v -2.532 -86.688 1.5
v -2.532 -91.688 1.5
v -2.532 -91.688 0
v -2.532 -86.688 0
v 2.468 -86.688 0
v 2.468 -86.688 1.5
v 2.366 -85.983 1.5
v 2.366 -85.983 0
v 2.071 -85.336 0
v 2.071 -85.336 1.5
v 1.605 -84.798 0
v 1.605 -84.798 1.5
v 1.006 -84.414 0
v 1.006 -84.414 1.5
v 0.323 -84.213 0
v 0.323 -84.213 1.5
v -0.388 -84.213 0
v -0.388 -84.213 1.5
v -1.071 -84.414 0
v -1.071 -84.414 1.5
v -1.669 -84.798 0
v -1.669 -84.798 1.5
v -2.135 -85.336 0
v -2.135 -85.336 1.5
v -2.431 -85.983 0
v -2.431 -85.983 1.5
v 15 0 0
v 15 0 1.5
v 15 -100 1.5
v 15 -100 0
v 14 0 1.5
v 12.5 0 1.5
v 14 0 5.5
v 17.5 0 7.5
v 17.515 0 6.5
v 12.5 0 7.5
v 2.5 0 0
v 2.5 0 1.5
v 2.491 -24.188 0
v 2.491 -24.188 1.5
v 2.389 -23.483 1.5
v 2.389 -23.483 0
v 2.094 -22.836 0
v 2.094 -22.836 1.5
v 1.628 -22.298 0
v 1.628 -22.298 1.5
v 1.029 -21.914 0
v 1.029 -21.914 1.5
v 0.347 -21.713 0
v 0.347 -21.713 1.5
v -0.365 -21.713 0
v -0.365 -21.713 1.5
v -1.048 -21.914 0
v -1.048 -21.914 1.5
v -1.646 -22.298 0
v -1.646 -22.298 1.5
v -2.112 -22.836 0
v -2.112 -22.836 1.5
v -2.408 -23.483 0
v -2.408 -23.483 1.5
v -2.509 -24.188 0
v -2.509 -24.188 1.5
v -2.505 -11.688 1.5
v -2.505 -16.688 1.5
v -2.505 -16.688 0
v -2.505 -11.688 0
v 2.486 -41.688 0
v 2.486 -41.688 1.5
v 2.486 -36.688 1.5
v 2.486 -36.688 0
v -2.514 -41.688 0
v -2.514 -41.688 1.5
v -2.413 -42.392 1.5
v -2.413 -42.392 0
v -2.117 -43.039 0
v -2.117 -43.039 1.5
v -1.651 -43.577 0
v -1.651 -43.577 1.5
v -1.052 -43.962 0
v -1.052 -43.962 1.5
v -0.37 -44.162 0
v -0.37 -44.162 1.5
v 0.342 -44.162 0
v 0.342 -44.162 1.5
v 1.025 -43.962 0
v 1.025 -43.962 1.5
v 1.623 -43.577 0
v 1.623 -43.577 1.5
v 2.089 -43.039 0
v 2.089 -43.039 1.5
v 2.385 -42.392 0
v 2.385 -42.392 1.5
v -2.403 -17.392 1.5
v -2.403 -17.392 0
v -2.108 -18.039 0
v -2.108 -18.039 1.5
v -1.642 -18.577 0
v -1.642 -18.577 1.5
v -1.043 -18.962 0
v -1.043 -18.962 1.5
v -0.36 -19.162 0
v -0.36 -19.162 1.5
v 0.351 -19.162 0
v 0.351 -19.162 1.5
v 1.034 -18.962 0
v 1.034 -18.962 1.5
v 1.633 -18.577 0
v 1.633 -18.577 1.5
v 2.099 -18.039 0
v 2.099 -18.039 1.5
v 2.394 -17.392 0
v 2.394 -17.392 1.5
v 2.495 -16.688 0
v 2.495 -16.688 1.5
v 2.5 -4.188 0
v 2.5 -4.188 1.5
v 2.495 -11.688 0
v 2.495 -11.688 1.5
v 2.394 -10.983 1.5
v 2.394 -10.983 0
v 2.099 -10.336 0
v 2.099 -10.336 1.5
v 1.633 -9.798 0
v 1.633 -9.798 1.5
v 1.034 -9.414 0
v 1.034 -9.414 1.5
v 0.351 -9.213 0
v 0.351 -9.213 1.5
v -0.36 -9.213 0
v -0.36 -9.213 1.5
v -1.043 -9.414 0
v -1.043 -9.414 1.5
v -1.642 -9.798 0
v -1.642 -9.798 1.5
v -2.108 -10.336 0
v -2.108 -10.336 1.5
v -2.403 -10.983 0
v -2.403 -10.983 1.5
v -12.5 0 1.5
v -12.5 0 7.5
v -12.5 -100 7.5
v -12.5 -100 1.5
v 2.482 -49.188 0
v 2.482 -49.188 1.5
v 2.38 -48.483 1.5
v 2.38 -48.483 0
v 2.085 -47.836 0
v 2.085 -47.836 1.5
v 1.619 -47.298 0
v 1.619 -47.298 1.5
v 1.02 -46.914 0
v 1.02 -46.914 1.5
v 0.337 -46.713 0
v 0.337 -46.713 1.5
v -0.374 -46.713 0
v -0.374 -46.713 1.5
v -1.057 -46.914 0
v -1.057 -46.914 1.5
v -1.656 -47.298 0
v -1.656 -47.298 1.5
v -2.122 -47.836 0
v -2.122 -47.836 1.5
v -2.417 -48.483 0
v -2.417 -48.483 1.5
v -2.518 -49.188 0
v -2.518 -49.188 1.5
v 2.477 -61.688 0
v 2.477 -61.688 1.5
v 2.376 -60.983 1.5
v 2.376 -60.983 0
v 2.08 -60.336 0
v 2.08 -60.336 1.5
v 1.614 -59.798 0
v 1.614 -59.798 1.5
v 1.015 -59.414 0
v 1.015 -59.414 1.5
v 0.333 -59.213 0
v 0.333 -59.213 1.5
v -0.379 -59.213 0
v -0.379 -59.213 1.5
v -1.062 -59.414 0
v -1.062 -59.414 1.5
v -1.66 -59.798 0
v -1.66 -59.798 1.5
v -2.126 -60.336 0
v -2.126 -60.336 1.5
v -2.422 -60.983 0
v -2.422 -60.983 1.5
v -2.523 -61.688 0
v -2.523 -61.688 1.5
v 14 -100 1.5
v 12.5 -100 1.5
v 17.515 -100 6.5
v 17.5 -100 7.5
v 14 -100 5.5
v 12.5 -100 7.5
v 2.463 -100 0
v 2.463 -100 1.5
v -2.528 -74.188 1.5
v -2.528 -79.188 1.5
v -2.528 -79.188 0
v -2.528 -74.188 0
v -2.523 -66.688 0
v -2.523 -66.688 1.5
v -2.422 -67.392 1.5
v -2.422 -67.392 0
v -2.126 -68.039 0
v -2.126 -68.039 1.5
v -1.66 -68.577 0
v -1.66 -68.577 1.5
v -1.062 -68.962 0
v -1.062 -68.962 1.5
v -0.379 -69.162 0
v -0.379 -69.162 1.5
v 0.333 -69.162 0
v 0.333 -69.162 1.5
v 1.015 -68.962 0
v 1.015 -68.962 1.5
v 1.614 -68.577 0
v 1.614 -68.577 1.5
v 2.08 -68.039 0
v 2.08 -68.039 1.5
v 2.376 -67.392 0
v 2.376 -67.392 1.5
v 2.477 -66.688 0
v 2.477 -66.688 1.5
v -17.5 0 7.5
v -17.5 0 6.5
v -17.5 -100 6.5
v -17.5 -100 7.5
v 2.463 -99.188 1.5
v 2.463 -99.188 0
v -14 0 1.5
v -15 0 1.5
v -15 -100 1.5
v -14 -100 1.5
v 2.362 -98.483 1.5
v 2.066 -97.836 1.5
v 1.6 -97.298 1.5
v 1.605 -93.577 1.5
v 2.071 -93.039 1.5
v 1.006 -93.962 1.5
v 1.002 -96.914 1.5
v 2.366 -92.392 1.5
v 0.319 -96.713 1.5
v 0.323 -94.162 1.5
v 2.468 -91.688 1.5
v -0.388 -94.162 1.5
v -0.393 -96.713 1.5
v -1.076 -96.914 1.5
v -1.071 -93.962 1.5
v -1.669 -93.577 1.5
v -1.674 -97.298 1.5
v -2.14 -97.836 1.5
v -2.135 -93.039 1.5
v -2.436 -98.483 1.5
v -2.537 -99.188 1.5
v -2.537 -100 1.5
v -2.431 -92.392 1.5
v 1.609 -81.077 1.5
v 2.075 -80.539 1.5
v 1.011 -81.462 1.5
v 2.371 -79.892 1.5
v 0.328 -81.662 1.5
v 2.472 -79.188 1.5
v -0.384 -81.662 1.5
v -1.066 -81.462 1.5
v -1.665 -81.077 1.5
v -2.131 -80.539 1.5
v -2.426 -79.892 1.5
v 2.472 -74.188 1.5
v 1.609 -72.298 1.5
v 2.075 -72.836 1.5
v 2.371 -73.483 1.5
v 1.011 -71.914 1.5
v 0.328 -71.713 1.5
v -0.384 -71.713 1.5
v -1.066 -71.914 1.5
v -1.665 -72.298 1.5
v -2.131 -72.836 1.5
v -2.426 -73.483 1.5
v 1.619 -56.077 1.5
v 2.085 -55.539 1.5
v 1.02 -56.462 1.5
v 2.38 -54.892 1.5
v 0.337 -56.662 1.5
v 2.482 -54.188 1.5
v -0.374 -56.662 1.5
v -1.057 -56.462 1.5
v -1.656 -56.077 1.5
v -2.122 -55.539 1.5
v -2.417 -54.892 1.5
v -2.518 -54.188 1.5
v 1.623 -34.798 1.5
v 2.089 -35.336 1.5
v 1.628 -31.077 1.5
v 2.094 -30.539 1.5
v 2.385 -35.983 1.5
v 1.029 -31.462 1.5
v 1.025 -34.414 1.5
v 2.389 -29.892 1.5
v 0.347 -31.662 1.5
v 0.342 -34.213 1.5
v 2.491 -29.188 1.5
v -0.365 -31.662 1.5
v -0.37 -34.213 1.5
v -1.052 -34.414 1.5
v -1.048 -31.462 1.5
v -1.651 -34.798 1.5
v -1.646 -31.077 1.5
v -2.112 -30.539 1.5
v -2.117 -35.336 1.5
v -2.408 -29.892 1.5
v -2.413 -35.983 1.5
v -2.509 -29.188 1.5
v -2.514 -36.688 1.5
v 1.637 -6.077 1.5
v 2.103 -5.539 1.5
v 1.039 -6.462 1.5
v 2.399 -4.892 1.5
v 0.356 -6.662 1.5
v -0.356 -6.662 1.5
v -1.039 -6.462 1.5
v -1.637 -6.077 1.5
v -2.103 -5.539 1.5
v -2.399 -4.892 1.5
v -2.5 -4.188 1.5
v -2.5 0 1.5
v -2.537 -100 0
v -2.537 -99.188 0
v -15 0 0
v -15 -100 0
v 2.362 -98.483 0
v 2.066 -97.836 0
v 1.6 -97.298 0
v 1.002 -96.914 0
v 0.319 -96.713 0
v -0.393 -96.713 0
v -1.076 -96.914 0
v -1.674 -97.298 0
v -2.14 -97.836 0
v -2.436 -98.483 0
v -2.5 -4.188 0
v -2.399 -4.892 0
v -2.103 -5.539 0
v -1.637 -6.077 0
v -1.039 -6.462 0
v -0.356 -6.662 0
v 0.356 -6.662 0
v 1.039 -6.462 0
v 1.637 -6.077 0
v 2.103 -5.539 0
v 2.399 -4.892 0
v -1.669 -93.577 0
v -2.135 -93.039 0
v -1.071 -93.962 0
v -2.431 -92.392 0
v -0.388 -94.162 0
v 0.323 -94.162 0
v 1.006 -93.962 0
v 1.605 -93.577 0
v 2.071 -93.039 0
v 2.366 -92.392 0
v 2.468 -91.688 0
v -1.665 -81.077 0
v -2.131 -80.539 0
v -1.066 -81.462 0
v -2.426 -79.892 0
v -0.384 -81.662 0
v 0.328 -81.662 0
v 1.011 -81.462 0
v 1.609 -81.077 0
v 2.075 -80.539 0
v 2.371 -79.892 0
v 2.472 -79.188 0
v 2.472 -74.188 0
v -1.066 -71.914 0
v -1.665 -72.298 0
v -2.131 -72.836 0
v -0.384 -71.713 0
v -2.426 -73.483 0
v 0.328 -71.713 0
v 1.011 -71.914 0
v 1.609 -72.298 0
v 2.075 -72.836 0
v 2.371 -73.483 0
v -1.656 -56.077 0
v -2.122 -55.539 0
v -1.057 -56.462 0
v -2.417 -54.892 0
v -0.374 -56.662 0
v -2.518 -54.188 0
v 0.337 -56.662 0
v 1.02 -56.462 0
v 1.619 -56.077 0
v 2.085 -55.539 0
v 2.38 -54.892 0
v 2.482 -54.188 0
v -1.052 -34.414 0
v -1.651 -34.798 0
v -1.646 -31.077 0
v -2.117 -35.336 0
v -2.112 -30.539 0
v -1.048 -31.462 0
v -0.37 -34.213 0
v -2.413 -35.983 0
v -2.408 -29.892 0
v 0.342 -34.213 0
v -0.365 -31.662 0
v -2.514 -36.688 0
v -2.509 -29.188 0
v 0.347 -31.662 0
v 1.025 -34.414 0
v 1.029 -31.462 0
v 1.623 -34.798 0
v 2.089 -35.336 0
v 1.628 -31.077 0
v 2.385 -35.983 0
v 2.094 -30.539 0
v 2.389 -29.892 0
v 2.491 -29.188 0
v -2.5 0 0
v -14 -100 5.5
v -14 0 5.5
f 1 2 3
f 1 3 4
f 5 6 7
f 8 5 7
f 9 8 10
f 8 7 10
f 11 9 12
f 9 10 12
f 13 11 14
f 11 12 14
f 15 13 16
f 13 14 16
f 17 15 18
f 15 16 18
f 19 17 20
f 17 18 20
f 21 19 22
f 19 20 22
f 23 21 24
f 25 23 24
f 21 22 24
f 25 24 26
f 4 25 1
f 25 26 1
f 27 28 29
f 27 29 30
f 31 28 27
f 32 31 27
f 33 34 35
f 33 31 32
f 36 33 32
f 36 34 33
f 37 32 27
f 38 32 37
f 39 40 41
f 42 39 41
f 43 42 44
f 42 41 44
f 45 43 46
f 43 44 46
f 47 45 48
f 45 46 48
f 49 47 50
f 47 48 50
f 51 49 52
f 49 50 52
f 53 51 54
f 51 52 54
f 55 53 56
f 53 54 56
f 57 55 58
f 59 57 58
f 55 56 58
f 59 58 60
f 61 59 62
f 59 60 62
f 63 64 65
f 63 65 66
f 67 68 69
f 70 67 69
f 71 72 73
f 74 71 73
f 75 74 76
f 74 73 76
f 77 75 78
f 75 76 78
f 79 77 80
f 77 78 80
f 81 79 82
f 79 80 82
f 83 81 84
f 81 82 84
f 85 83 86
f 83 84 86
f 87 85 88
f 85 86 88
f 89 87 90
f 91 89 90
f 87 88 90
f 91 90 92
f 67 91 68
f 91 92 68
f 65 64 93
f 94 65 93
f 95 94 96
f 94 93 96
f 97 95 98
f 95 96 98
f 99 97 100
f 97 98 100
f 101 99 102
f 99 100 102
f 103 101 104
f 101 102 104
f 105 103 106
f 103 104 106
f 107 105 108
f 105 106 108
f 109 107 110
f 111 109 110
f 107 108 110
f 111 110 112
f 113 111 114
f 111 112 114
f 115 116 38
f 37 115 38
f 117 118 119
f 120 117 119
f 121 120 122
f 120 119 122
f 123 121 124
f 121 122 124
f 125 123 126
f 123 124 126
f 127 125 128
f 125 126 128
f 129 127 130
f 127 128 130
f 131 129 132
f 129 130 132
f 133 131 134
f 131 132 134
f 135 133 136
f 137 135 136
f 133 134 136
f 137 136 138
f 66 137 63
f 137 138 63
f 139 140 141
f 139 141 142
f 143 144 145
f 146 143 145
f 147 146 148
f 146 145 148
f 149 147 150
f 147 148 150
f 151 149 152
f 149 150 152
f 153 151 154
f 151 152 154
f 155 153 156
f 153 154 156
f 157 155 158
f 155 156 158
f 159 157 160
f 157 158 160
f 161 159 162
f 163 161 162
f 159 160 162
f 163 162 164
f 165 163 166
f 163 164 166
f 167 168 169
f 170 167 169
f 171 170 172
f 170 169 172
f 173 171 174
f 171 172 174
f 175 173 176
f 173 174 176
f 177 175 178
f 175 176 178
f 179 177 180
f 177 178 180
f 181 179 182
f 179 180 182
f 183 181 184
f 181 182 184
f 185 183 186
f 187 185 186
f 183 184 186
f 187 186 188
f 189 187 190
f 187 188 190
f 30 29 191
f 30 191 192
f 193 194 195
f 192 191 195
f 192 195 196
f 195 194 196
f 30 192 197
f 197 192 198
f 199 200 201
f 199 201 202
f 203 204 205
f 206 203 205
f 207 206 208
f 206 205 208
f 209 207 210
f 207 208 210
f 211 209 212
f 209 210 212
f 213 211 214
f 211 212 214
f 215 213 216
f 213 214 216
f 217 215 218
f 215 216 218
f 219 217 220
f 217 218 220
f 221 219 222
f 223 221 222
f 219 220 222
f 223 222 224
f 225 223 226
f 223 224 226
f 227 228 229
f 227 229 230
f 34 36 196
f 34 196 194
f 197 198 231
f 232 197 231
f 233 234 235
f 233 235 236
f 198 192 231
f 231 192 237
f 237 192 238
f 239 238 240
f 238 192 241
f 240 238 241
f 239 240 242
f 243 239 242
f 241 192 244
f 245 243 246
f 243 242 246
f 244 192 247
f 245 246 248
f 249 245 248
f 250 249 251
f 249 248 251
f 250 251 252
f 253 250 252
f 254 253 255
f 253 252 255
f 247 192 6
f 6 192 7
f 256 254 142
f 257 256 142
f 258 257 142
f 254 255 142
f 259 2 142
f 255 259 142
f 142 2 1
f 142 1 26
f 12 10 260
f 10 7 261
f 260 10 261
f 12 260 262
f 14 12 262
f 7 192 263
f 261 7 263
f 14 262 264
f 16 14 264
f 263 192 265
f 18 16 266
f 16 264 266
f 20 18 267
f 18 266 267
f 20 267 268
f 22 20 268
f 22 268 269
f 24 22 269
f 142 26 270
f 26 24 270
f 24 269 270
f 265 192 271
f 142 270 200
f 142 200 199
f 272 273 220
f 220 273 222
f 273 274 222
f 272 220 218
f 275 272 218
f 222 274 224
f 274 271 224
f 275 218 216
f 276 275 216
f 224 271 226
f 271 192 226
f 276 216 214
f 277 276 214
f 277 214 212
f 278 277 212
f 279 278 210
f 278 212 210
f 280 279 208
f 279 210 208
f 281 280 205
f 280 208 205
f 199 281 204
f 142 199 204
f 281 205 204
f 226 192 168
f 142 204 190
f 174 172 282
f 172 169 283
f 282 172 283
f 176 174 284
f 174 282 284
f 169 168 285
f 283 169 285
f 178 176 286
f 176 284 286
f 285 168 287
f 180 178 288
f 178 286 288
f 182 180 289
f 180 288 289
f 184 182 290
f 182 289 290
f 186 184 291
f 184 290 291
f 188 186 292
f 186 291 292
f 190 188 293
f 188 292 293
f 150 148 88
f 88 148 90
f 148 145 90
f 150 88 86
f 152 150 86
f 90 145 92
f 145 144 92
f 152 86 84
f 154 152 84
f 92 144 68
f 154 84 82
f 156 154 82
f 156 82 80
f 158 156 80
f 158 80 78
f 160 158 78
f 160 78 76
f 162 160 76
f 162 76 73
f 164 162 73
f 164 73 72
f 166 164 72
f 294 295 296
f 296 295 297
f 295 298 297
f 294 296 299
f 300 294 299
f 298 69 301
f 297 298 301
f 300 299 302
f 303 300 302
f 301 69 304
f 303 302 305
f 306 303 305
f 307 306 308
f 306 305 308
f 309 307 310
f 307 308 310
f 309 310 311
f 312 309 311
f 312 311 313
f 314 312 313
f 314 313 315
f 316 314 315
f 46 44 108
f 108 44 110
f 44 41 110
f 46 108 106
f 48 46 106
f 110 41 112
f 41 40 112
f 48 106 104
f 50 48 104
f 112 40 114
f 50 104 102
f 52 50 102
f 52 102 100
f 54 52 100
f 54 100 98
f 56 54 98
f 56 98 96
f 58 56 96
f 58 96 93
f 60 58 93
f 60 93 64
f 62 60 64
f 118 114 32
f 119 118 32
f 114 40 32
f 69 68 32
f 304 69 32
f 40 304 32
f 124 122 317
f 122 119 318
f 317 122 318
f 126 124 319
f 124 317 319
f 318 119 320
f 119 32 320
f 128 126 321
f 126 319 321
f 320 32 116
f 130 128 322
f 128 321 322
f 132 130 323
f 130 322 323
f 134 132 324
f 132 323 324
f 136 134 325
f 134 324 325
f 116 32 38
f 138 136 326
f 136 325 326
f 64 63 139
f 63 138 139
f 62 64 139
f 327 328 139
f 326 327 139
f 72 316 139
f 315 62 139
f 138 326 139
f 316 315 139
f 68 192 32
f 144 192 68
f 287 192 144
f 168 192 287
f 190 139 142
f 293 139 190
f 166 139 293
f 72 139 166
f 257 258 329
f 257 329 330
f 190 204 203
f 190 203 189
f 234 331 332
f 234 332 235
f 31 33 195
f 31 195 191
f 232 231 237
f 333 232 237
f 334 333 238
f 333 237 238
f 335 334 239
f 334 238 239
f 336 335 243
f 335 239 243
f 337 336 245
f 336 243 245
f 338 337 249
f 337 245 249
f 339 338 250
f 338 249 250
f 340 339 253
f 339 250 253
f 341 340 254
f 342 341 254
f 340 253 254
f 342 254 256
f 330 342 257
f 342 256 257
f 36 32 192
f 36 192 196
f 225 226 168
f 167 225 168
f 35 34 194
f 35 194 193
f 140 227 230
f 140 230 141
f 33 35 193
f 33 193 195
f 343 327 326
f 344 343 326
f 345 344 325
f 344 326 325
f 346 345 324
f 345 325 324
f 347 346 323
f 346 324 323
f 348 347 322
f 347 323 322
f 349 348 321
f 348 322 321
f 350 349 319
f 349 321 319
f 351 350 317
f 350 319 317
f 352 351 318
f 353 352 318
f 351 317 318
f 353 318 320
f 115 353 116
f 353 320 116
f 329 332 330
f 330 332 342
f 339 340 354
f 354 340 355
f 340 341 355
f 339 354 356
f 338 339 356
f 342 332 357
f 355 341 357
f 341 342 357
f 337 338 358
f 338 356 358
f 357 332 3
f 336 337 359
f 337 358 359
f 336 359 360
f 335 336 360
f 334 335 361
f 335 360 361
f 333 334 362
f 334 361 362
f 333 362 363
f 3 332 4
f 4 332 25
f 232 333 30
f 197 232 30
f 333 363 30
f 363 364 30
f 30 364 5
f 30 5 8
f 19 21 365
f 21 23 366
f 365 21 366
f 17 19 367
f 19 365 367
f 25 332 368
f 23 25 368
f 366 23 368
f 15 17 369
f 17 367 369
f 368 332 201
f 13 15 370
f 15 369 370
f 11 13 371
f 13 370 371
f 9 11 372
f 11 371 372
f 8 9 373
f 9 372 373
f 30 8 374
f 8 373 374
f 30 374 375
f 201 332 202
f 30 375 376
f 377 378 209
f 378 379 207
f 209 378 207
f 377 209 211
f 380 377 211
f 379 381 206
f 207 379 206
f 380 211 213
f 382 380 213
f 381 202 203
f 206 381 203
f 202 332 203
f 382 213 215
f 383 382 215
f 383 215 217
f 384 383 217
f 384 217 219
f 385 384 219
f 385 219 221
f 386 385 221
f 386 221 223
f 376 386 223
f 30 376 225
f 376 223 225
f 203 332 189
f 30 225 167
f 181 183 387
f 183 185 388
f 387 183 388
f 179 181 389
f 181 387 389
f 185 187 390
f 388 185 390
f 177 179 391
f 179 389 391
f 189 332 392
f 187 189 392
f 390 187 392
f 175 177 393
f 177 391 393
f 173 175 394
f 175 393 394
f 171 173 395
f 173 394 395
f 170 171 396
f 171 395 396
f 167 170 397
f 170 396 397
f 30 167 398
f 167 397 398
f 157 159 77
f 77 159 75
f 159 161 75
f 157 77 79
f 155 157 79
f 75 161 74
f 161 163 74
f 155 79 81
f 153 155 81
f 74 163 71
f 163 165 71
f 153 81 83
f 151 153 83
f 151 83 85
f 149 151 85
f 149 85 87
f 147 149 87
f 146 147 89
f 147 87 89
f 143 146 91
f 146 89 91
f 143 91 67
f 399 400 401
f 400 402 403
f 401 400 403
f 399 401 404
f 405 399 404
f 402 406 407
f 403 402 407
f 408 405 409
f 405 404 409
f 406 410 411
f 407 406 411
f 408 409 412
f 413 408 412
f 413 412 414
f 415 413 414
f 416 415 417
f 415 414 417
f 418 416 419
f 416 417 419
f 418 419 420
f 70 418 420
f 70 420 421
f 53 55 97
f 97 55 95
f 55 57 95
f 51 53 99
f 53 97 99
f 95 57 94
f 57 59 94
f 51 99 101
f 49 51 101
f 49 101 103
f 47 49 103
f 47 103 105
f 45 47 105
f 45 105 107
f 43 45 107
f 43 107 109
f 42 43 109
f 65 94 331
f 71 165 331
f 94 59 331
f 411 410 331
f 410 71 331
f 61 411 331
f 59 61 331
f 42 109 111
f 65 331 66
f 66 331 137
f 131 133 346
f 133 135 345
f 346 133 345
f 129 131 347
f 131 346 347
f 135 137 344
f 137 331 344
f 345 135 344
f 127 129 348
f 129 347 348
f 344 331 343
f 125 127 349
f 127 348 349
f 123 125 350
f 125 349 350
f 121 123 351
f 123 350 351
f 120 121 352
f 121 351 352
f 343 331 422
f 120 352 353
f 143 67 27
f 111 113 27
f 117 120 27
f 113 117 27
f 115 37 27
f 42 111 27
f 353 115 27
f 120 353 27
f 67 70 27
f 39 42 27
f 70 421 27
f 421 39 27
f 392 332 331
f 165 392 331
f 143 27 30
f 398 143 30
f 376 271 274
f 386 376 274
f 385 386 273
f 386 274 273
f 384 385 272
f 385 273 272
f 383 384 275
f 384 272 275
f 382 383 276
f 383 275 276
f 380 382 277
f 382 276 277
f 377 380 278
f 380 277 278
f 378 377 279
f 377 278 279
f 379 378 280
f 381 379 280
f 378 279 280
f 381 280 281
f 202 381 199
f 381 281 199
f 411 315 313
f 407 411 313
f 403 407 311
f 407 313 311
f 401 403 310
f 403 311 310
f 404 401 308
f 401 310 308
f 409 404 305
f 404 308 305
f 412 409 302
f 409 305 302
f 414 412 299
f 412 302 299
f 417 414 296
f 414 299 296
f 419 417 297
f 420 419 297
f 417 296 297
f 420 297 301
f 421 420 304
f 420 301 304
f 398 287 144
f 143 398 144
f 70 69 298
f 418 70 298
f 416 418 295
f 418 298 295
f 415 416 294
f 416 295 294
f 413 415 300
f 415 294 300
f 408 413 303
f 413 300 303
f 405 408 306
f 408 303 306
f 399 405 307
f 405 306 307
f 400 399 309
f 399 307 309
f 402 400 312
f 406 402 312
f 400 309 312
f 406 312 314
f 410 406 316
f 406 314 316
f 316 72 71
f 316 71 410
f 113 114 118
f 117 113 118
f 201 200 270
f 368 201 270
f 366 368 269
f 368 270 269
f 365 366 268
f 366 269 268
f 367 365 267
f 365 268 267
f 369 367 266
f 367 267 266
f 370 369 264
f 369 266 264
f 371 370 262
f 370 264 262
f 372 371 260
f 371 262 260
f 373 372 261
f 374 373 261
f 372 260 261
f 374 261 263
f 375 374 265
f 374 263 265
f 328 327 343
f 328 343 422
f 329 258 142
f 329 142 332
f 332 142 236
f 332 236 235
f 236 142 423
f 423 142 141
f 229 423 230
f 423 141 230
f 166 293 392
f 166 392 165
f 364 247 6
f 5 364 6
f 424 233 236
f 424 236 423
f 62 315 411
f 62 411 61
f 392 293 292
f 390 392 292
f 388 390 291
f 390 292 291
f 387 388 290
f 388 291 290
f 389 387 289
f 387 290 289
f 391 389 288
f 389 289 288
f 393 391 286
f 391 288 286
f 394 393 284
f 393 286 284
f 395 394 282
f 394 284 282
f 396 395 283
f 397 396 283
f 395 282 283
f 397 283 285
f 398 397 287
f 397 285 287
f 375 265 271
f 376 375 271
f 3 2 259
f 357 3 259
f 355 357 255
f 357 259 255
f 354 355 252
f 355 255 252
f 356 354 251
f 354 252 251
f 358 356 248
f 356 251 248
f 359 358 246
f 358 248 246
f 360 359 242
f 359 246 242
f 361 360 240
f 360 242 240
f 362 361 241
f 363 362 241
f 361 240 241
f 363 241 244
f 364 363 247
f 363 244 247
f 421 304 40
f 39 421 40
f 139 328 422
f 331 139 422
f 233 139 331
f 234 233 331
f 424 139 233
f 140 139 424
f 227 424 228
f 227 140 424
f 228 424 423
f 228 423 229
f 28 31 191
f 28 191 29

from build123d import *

# Parameters (mm, degrees)
PAD_DEPTH       = 100
POCKET_DEPTH    = 2
POCKET001_DEPTH = 3


with BuildPart() as part:
    # Sketch → Pad (new body)
    with BuildSketch(Plane.XZ):
        Polygon((0, 0), (-15, 0), (-15, 1.5), (-14, 1.5), (-14, 5.5), (-17.5, 6.5), (-17.5, 7.5), (-12.5, 7.5), (-12.5, 1.5), (0, 1.5), (12.5, 1.5), (12.5, 7.5), (17.5, 7.5), (17.51485, 6.5), (14, 5.5), (14, 1.5), (15, 1.5), (15, 0), align=None)
    extrude(amount=PAD_DEPTH)

    # Sketch001 (on Face10 of Pad) → Pocket (cut)
    with BuildSketch(Plane(origin=(0, 0, 1.5), x_dir=(-1, 0, 0), z_dir=(0, 0, 1))):
        with BuildLine():
            ThreePointArc((2.5, 4.187631), (0, 6.687631), (-2.5, 4.187631))
            Line((-2.5, 4.187631), (-2.5, -0.812369))
            ThreePointArc((-2.5, -0.812369), (0, -3.312369), (2.5, -0.812369))
            Line((2.5, 4.187631), (2.5, -0.812369))
        make_face()
        with BuildLine():
            ThreePointArc((2.50462, 16.68763), (0.00462, 19.18763), (-2.49538, 16.68763))
            Line((-2.49538, 16.68763), (-2.49538, 11.68763))
            ThreePointArc((-2.49538, 11.68763), (0.00462, 9.18763), (2.50462, 11.68763))
            Line((2.50462, 16.68763), (2.50462, 11.68763))
        make_face()
        with BuildLine():
            ThreePointArc((2.509241, 29.187629), (0.009241, 31.687629), (-2.490759, 29.187629))
            Line((-2.490759, 29.187629), (-2.490759, 24.187629))
            ThreePointArc((-2.490759, 24.187629), (0.009241, 21.687629), (2.509241, 24.187629))
            Line((2.509241, 29.187629), (2.509241, 24.187629))
        make_face()
        with BuildLine():
            ThreePointArc((2.513861, 41.687629), (0.013861, 44.187629), (-2.486139, 41.687629))
            Line((-2.486139, 41.687629), (-2.486139, 36.687629))
            ThreePointArc((-2.486139, 36.687629), (0.013861, 34.187629), (2.513861, 36.687629))
            Line((2.513861, 41.687629), (2.513861, 36.687629))
        make_face()
        with BuildLine():
            ThreePointArc((2.518482, 54.187628), (0.018482, 56.687628), (-2.481518, 54.187628))
            Line((-2.481518, 54.187628), (-2.481518, 49.187628))
            ThreePointArc((-2.481518, 49.187628), (0.018482, 46.687628), (2.518482, 49.187628))
            Line((2.518482, 54.187628), (2.518482, 49.187628))
        make_face()
        with BuildLine():
            ThreePointArc((2.523102, 66.687627), (0.023102, 69.187627), (-2.476898, 66.687627))
            Line((-2.476898, 66.687627), (-2.476898, 61.687627))
            ThreePointArc((-2.476898, 61.687627), (0.023102, 59.187627), (2.523102, 61.687627))
            Line((2.523102, 66.687627), (2.523102, 61.687627))
        make_face()
        with BuildLine():
            ThreePointArc((2.527723, 79.187626), (0.027723, 81.687626), (-2.472277, 79.187626))
            Line((-2.472277, 79.187626), (-2.472277, 74.187626))
            ThreePointArc((-2.472277, 74.187626), (0.027723, 71.687626), (2.527723, 74.187626))
            Line((2.527723, 79.187626), (2.527723, 74.187626))
        make_face()
        with BuildLine():
            ThreePointArc((2.532343, 91.687625), (0.032343, 94.187625), (-2.467657, 91.687625))
            Line((-2.467657, 91.687625), (-2.467657, 86.687625))
            ThreePointArc((-2.467657, 86.687625), (0.032343, 84.187625), (2.532343, 86.687625))
            Line((2.532343, 91.687625), (2.532343, 86.687625))
        make_face()
        with BuildLine():
            ThreePointArc((2.536964, 104.187624), (0.036964, 106.687624), (-2.463036, 104.187624))
            Line((-2.463036, 104.187624), (-2.463036, 99.187624))
            ThreePointArc((-2.463036, 99.187624), (0.036964, 96.687624), (2.536964, 99.187624))
            Line((2.536964, 104.187624), (2.536964, 99.187624))
        make_face()
        with BuildLine():
            ThreePointArc((2.541584, 116.687623), (0.041584, 119.187623), (-2.458416, 116.687623))
            Line((-2.458416, 116.687623), (-2.458416, 111.687623))
            ThreePointArc((-2.458416, 111.687623), (0.041584, 109.187623), (2.541584, 111.687623))
            Line((2.541584, 116.687623), (2.541584, 111.687623))
        make_face()
    extrude(amount=-POCKET_DEPTH, mode=Mode.SUBTRACT)

    # Sketch001 (on Face10 of Pad) → Pocket001 (cut)
    with BuildSketch(Plane(origin=(0, 0, 1.5), x_dir=(-1, 0, 0), z_dir=(0, 0, 1))):
        with BuildLine():
            ThreePointArc((2.5, 4.187631), (0, 6.687631), (-2.5, 4.187631))
            Line((-2.5, 4.187631), (-2.5, -0.812369))
            ThreePointArc((-2.5, -0.812369), (0, -3.312369), (2.5, -0.812369))
            Line((2.5, 4.187631), (2.5, -0.812369))
        make_face()
        with BuildLine():
            ThreePointArc((2.50462, 16.68763), (0.00462, 19.18763), (-2.49538, 16.68763))
            Line((-2.49538, 16.68763), (-2.49538, 11.68763))
            ThreePointArc((-2.49538, 11.68763), (0.00462, 9.18763), (2.50462, 11.68763))
            Line((2.50462, 16.68763), (2.50462, 11.68763))
        make_face()
        with BuildLine():
            ThreePointArc((2.509241, 29.187629), (0.009241, 31.687629), (-2.490759, 29.187629))
            Line((-2.490759, 29.187629), (-2.490759, 24.187629))
            ThreePointArc((-2.490759, 24.187629), (0.009241, 21.687629), (2.509241, 24.187629))
            Line((2.509241, 29.187629), (2.509241, 24.187629))
        make_face()
        with BuildLine():
            ThreePointArc((2.513861, 41.687629), (0.013861, 44.187629), (-2.486139, 41.687629))
            Line((-2.486139, 41.687629), (-2.486139, 36.687629))
            ThreePointArc((-2.486139, 36.687629), (0.013861, 34.187629), (2.513861, 36.687629))
            Line((2.513861, 41.687629), (2.513861, 36.687629))
        make_face()
        with BuildLine():
            ThreePointArc((2.518482, 54.187628), (0.018482, 56.687628), (-2.481518, 54.187628))
            Line((-2.481518, 54.187628), (-2.481518, 49.187628))
            ThreePointArc((-2.481518, 49.187628), (0.018482, 46.687628), (2.518482, 49.187628))
            Line((2.518482, 54.187628), (2.518482, 49.187628))
        make_face()
        with BuildLine():
            ThreePointArc((2.523102, 66.687627), (0.023102, 69.187627), (-2.476898, 66.687627))
            Line((-2.476898, 66.687627), (-2.476898, 61.687627))
            ThreePointArc((-2.476898, 61.687627), (0.023102, 59.187627), (2.523102, 61.687627))
            Line((2.523102, 66.687627), (2.523102, 61.687627))
        make_face()
        with BuildLine():
            ThreePointArc((2.527723, 79.187626), (0.027723, 81.687626), (-2.472277, 79.187626))
            Line((-2.472277, 79.187626), (-2.472277, 74.187626))
            ThreePointArc((-2.472277, 74.187626), (0.027723, 71.687626), (2.527723, 74.187626))
            Line((2.527723, 79.187626), (2.527723, 74.187626))
        make_face()
        with BuildLine():
            ThreePointArc((2.532343, 91.687625), (0.032343, 94.187625), (-2.467657, 91.687625))
            Line((-2.467657, 91.687625), (-2.467657, 86.687625))
            ThreePointArc((-2.467657, 86.687625), (0.032343, 84.187625), (2.532343, 86.687625))
            Line((2.532343, 91.687625), (2.532343, 86.687625))
        make_face()
        with BuildLine():
            ThreePointArc((2.536964, 104.187624), (0.036964, 106.687624), (-2.463036, 104.187624))
            Line((-2.463036, 104.187624), (-2.463036, 99.187624))
            ThreePointArc((-2.463036, 99.187624), (0.036964, 96.687624), (2.536964, 99.187624))
            Line((2.536964, 104.187624), (2.536964, 99.187624))
        make_face()
        with BuildLine():
            ThreePointArc((2.541584, 116.687623), (0.041584, 119.187623), (-2.458416, 116.687623))
            Line((-2.458416, 116.687623), (-2.458416, 111.687623))
            ThreePointArc((-2.458416, 111.687623), (0.041584, 109.187623), (2.541584, 111.687623))
            Line((2.541584, 116.687623), (2.541584, 111.687623))
        make_face()
    extrude(amount=-POCKET001_DEPTH, mode=Mode.SUBTRACT)


solid = part.part
